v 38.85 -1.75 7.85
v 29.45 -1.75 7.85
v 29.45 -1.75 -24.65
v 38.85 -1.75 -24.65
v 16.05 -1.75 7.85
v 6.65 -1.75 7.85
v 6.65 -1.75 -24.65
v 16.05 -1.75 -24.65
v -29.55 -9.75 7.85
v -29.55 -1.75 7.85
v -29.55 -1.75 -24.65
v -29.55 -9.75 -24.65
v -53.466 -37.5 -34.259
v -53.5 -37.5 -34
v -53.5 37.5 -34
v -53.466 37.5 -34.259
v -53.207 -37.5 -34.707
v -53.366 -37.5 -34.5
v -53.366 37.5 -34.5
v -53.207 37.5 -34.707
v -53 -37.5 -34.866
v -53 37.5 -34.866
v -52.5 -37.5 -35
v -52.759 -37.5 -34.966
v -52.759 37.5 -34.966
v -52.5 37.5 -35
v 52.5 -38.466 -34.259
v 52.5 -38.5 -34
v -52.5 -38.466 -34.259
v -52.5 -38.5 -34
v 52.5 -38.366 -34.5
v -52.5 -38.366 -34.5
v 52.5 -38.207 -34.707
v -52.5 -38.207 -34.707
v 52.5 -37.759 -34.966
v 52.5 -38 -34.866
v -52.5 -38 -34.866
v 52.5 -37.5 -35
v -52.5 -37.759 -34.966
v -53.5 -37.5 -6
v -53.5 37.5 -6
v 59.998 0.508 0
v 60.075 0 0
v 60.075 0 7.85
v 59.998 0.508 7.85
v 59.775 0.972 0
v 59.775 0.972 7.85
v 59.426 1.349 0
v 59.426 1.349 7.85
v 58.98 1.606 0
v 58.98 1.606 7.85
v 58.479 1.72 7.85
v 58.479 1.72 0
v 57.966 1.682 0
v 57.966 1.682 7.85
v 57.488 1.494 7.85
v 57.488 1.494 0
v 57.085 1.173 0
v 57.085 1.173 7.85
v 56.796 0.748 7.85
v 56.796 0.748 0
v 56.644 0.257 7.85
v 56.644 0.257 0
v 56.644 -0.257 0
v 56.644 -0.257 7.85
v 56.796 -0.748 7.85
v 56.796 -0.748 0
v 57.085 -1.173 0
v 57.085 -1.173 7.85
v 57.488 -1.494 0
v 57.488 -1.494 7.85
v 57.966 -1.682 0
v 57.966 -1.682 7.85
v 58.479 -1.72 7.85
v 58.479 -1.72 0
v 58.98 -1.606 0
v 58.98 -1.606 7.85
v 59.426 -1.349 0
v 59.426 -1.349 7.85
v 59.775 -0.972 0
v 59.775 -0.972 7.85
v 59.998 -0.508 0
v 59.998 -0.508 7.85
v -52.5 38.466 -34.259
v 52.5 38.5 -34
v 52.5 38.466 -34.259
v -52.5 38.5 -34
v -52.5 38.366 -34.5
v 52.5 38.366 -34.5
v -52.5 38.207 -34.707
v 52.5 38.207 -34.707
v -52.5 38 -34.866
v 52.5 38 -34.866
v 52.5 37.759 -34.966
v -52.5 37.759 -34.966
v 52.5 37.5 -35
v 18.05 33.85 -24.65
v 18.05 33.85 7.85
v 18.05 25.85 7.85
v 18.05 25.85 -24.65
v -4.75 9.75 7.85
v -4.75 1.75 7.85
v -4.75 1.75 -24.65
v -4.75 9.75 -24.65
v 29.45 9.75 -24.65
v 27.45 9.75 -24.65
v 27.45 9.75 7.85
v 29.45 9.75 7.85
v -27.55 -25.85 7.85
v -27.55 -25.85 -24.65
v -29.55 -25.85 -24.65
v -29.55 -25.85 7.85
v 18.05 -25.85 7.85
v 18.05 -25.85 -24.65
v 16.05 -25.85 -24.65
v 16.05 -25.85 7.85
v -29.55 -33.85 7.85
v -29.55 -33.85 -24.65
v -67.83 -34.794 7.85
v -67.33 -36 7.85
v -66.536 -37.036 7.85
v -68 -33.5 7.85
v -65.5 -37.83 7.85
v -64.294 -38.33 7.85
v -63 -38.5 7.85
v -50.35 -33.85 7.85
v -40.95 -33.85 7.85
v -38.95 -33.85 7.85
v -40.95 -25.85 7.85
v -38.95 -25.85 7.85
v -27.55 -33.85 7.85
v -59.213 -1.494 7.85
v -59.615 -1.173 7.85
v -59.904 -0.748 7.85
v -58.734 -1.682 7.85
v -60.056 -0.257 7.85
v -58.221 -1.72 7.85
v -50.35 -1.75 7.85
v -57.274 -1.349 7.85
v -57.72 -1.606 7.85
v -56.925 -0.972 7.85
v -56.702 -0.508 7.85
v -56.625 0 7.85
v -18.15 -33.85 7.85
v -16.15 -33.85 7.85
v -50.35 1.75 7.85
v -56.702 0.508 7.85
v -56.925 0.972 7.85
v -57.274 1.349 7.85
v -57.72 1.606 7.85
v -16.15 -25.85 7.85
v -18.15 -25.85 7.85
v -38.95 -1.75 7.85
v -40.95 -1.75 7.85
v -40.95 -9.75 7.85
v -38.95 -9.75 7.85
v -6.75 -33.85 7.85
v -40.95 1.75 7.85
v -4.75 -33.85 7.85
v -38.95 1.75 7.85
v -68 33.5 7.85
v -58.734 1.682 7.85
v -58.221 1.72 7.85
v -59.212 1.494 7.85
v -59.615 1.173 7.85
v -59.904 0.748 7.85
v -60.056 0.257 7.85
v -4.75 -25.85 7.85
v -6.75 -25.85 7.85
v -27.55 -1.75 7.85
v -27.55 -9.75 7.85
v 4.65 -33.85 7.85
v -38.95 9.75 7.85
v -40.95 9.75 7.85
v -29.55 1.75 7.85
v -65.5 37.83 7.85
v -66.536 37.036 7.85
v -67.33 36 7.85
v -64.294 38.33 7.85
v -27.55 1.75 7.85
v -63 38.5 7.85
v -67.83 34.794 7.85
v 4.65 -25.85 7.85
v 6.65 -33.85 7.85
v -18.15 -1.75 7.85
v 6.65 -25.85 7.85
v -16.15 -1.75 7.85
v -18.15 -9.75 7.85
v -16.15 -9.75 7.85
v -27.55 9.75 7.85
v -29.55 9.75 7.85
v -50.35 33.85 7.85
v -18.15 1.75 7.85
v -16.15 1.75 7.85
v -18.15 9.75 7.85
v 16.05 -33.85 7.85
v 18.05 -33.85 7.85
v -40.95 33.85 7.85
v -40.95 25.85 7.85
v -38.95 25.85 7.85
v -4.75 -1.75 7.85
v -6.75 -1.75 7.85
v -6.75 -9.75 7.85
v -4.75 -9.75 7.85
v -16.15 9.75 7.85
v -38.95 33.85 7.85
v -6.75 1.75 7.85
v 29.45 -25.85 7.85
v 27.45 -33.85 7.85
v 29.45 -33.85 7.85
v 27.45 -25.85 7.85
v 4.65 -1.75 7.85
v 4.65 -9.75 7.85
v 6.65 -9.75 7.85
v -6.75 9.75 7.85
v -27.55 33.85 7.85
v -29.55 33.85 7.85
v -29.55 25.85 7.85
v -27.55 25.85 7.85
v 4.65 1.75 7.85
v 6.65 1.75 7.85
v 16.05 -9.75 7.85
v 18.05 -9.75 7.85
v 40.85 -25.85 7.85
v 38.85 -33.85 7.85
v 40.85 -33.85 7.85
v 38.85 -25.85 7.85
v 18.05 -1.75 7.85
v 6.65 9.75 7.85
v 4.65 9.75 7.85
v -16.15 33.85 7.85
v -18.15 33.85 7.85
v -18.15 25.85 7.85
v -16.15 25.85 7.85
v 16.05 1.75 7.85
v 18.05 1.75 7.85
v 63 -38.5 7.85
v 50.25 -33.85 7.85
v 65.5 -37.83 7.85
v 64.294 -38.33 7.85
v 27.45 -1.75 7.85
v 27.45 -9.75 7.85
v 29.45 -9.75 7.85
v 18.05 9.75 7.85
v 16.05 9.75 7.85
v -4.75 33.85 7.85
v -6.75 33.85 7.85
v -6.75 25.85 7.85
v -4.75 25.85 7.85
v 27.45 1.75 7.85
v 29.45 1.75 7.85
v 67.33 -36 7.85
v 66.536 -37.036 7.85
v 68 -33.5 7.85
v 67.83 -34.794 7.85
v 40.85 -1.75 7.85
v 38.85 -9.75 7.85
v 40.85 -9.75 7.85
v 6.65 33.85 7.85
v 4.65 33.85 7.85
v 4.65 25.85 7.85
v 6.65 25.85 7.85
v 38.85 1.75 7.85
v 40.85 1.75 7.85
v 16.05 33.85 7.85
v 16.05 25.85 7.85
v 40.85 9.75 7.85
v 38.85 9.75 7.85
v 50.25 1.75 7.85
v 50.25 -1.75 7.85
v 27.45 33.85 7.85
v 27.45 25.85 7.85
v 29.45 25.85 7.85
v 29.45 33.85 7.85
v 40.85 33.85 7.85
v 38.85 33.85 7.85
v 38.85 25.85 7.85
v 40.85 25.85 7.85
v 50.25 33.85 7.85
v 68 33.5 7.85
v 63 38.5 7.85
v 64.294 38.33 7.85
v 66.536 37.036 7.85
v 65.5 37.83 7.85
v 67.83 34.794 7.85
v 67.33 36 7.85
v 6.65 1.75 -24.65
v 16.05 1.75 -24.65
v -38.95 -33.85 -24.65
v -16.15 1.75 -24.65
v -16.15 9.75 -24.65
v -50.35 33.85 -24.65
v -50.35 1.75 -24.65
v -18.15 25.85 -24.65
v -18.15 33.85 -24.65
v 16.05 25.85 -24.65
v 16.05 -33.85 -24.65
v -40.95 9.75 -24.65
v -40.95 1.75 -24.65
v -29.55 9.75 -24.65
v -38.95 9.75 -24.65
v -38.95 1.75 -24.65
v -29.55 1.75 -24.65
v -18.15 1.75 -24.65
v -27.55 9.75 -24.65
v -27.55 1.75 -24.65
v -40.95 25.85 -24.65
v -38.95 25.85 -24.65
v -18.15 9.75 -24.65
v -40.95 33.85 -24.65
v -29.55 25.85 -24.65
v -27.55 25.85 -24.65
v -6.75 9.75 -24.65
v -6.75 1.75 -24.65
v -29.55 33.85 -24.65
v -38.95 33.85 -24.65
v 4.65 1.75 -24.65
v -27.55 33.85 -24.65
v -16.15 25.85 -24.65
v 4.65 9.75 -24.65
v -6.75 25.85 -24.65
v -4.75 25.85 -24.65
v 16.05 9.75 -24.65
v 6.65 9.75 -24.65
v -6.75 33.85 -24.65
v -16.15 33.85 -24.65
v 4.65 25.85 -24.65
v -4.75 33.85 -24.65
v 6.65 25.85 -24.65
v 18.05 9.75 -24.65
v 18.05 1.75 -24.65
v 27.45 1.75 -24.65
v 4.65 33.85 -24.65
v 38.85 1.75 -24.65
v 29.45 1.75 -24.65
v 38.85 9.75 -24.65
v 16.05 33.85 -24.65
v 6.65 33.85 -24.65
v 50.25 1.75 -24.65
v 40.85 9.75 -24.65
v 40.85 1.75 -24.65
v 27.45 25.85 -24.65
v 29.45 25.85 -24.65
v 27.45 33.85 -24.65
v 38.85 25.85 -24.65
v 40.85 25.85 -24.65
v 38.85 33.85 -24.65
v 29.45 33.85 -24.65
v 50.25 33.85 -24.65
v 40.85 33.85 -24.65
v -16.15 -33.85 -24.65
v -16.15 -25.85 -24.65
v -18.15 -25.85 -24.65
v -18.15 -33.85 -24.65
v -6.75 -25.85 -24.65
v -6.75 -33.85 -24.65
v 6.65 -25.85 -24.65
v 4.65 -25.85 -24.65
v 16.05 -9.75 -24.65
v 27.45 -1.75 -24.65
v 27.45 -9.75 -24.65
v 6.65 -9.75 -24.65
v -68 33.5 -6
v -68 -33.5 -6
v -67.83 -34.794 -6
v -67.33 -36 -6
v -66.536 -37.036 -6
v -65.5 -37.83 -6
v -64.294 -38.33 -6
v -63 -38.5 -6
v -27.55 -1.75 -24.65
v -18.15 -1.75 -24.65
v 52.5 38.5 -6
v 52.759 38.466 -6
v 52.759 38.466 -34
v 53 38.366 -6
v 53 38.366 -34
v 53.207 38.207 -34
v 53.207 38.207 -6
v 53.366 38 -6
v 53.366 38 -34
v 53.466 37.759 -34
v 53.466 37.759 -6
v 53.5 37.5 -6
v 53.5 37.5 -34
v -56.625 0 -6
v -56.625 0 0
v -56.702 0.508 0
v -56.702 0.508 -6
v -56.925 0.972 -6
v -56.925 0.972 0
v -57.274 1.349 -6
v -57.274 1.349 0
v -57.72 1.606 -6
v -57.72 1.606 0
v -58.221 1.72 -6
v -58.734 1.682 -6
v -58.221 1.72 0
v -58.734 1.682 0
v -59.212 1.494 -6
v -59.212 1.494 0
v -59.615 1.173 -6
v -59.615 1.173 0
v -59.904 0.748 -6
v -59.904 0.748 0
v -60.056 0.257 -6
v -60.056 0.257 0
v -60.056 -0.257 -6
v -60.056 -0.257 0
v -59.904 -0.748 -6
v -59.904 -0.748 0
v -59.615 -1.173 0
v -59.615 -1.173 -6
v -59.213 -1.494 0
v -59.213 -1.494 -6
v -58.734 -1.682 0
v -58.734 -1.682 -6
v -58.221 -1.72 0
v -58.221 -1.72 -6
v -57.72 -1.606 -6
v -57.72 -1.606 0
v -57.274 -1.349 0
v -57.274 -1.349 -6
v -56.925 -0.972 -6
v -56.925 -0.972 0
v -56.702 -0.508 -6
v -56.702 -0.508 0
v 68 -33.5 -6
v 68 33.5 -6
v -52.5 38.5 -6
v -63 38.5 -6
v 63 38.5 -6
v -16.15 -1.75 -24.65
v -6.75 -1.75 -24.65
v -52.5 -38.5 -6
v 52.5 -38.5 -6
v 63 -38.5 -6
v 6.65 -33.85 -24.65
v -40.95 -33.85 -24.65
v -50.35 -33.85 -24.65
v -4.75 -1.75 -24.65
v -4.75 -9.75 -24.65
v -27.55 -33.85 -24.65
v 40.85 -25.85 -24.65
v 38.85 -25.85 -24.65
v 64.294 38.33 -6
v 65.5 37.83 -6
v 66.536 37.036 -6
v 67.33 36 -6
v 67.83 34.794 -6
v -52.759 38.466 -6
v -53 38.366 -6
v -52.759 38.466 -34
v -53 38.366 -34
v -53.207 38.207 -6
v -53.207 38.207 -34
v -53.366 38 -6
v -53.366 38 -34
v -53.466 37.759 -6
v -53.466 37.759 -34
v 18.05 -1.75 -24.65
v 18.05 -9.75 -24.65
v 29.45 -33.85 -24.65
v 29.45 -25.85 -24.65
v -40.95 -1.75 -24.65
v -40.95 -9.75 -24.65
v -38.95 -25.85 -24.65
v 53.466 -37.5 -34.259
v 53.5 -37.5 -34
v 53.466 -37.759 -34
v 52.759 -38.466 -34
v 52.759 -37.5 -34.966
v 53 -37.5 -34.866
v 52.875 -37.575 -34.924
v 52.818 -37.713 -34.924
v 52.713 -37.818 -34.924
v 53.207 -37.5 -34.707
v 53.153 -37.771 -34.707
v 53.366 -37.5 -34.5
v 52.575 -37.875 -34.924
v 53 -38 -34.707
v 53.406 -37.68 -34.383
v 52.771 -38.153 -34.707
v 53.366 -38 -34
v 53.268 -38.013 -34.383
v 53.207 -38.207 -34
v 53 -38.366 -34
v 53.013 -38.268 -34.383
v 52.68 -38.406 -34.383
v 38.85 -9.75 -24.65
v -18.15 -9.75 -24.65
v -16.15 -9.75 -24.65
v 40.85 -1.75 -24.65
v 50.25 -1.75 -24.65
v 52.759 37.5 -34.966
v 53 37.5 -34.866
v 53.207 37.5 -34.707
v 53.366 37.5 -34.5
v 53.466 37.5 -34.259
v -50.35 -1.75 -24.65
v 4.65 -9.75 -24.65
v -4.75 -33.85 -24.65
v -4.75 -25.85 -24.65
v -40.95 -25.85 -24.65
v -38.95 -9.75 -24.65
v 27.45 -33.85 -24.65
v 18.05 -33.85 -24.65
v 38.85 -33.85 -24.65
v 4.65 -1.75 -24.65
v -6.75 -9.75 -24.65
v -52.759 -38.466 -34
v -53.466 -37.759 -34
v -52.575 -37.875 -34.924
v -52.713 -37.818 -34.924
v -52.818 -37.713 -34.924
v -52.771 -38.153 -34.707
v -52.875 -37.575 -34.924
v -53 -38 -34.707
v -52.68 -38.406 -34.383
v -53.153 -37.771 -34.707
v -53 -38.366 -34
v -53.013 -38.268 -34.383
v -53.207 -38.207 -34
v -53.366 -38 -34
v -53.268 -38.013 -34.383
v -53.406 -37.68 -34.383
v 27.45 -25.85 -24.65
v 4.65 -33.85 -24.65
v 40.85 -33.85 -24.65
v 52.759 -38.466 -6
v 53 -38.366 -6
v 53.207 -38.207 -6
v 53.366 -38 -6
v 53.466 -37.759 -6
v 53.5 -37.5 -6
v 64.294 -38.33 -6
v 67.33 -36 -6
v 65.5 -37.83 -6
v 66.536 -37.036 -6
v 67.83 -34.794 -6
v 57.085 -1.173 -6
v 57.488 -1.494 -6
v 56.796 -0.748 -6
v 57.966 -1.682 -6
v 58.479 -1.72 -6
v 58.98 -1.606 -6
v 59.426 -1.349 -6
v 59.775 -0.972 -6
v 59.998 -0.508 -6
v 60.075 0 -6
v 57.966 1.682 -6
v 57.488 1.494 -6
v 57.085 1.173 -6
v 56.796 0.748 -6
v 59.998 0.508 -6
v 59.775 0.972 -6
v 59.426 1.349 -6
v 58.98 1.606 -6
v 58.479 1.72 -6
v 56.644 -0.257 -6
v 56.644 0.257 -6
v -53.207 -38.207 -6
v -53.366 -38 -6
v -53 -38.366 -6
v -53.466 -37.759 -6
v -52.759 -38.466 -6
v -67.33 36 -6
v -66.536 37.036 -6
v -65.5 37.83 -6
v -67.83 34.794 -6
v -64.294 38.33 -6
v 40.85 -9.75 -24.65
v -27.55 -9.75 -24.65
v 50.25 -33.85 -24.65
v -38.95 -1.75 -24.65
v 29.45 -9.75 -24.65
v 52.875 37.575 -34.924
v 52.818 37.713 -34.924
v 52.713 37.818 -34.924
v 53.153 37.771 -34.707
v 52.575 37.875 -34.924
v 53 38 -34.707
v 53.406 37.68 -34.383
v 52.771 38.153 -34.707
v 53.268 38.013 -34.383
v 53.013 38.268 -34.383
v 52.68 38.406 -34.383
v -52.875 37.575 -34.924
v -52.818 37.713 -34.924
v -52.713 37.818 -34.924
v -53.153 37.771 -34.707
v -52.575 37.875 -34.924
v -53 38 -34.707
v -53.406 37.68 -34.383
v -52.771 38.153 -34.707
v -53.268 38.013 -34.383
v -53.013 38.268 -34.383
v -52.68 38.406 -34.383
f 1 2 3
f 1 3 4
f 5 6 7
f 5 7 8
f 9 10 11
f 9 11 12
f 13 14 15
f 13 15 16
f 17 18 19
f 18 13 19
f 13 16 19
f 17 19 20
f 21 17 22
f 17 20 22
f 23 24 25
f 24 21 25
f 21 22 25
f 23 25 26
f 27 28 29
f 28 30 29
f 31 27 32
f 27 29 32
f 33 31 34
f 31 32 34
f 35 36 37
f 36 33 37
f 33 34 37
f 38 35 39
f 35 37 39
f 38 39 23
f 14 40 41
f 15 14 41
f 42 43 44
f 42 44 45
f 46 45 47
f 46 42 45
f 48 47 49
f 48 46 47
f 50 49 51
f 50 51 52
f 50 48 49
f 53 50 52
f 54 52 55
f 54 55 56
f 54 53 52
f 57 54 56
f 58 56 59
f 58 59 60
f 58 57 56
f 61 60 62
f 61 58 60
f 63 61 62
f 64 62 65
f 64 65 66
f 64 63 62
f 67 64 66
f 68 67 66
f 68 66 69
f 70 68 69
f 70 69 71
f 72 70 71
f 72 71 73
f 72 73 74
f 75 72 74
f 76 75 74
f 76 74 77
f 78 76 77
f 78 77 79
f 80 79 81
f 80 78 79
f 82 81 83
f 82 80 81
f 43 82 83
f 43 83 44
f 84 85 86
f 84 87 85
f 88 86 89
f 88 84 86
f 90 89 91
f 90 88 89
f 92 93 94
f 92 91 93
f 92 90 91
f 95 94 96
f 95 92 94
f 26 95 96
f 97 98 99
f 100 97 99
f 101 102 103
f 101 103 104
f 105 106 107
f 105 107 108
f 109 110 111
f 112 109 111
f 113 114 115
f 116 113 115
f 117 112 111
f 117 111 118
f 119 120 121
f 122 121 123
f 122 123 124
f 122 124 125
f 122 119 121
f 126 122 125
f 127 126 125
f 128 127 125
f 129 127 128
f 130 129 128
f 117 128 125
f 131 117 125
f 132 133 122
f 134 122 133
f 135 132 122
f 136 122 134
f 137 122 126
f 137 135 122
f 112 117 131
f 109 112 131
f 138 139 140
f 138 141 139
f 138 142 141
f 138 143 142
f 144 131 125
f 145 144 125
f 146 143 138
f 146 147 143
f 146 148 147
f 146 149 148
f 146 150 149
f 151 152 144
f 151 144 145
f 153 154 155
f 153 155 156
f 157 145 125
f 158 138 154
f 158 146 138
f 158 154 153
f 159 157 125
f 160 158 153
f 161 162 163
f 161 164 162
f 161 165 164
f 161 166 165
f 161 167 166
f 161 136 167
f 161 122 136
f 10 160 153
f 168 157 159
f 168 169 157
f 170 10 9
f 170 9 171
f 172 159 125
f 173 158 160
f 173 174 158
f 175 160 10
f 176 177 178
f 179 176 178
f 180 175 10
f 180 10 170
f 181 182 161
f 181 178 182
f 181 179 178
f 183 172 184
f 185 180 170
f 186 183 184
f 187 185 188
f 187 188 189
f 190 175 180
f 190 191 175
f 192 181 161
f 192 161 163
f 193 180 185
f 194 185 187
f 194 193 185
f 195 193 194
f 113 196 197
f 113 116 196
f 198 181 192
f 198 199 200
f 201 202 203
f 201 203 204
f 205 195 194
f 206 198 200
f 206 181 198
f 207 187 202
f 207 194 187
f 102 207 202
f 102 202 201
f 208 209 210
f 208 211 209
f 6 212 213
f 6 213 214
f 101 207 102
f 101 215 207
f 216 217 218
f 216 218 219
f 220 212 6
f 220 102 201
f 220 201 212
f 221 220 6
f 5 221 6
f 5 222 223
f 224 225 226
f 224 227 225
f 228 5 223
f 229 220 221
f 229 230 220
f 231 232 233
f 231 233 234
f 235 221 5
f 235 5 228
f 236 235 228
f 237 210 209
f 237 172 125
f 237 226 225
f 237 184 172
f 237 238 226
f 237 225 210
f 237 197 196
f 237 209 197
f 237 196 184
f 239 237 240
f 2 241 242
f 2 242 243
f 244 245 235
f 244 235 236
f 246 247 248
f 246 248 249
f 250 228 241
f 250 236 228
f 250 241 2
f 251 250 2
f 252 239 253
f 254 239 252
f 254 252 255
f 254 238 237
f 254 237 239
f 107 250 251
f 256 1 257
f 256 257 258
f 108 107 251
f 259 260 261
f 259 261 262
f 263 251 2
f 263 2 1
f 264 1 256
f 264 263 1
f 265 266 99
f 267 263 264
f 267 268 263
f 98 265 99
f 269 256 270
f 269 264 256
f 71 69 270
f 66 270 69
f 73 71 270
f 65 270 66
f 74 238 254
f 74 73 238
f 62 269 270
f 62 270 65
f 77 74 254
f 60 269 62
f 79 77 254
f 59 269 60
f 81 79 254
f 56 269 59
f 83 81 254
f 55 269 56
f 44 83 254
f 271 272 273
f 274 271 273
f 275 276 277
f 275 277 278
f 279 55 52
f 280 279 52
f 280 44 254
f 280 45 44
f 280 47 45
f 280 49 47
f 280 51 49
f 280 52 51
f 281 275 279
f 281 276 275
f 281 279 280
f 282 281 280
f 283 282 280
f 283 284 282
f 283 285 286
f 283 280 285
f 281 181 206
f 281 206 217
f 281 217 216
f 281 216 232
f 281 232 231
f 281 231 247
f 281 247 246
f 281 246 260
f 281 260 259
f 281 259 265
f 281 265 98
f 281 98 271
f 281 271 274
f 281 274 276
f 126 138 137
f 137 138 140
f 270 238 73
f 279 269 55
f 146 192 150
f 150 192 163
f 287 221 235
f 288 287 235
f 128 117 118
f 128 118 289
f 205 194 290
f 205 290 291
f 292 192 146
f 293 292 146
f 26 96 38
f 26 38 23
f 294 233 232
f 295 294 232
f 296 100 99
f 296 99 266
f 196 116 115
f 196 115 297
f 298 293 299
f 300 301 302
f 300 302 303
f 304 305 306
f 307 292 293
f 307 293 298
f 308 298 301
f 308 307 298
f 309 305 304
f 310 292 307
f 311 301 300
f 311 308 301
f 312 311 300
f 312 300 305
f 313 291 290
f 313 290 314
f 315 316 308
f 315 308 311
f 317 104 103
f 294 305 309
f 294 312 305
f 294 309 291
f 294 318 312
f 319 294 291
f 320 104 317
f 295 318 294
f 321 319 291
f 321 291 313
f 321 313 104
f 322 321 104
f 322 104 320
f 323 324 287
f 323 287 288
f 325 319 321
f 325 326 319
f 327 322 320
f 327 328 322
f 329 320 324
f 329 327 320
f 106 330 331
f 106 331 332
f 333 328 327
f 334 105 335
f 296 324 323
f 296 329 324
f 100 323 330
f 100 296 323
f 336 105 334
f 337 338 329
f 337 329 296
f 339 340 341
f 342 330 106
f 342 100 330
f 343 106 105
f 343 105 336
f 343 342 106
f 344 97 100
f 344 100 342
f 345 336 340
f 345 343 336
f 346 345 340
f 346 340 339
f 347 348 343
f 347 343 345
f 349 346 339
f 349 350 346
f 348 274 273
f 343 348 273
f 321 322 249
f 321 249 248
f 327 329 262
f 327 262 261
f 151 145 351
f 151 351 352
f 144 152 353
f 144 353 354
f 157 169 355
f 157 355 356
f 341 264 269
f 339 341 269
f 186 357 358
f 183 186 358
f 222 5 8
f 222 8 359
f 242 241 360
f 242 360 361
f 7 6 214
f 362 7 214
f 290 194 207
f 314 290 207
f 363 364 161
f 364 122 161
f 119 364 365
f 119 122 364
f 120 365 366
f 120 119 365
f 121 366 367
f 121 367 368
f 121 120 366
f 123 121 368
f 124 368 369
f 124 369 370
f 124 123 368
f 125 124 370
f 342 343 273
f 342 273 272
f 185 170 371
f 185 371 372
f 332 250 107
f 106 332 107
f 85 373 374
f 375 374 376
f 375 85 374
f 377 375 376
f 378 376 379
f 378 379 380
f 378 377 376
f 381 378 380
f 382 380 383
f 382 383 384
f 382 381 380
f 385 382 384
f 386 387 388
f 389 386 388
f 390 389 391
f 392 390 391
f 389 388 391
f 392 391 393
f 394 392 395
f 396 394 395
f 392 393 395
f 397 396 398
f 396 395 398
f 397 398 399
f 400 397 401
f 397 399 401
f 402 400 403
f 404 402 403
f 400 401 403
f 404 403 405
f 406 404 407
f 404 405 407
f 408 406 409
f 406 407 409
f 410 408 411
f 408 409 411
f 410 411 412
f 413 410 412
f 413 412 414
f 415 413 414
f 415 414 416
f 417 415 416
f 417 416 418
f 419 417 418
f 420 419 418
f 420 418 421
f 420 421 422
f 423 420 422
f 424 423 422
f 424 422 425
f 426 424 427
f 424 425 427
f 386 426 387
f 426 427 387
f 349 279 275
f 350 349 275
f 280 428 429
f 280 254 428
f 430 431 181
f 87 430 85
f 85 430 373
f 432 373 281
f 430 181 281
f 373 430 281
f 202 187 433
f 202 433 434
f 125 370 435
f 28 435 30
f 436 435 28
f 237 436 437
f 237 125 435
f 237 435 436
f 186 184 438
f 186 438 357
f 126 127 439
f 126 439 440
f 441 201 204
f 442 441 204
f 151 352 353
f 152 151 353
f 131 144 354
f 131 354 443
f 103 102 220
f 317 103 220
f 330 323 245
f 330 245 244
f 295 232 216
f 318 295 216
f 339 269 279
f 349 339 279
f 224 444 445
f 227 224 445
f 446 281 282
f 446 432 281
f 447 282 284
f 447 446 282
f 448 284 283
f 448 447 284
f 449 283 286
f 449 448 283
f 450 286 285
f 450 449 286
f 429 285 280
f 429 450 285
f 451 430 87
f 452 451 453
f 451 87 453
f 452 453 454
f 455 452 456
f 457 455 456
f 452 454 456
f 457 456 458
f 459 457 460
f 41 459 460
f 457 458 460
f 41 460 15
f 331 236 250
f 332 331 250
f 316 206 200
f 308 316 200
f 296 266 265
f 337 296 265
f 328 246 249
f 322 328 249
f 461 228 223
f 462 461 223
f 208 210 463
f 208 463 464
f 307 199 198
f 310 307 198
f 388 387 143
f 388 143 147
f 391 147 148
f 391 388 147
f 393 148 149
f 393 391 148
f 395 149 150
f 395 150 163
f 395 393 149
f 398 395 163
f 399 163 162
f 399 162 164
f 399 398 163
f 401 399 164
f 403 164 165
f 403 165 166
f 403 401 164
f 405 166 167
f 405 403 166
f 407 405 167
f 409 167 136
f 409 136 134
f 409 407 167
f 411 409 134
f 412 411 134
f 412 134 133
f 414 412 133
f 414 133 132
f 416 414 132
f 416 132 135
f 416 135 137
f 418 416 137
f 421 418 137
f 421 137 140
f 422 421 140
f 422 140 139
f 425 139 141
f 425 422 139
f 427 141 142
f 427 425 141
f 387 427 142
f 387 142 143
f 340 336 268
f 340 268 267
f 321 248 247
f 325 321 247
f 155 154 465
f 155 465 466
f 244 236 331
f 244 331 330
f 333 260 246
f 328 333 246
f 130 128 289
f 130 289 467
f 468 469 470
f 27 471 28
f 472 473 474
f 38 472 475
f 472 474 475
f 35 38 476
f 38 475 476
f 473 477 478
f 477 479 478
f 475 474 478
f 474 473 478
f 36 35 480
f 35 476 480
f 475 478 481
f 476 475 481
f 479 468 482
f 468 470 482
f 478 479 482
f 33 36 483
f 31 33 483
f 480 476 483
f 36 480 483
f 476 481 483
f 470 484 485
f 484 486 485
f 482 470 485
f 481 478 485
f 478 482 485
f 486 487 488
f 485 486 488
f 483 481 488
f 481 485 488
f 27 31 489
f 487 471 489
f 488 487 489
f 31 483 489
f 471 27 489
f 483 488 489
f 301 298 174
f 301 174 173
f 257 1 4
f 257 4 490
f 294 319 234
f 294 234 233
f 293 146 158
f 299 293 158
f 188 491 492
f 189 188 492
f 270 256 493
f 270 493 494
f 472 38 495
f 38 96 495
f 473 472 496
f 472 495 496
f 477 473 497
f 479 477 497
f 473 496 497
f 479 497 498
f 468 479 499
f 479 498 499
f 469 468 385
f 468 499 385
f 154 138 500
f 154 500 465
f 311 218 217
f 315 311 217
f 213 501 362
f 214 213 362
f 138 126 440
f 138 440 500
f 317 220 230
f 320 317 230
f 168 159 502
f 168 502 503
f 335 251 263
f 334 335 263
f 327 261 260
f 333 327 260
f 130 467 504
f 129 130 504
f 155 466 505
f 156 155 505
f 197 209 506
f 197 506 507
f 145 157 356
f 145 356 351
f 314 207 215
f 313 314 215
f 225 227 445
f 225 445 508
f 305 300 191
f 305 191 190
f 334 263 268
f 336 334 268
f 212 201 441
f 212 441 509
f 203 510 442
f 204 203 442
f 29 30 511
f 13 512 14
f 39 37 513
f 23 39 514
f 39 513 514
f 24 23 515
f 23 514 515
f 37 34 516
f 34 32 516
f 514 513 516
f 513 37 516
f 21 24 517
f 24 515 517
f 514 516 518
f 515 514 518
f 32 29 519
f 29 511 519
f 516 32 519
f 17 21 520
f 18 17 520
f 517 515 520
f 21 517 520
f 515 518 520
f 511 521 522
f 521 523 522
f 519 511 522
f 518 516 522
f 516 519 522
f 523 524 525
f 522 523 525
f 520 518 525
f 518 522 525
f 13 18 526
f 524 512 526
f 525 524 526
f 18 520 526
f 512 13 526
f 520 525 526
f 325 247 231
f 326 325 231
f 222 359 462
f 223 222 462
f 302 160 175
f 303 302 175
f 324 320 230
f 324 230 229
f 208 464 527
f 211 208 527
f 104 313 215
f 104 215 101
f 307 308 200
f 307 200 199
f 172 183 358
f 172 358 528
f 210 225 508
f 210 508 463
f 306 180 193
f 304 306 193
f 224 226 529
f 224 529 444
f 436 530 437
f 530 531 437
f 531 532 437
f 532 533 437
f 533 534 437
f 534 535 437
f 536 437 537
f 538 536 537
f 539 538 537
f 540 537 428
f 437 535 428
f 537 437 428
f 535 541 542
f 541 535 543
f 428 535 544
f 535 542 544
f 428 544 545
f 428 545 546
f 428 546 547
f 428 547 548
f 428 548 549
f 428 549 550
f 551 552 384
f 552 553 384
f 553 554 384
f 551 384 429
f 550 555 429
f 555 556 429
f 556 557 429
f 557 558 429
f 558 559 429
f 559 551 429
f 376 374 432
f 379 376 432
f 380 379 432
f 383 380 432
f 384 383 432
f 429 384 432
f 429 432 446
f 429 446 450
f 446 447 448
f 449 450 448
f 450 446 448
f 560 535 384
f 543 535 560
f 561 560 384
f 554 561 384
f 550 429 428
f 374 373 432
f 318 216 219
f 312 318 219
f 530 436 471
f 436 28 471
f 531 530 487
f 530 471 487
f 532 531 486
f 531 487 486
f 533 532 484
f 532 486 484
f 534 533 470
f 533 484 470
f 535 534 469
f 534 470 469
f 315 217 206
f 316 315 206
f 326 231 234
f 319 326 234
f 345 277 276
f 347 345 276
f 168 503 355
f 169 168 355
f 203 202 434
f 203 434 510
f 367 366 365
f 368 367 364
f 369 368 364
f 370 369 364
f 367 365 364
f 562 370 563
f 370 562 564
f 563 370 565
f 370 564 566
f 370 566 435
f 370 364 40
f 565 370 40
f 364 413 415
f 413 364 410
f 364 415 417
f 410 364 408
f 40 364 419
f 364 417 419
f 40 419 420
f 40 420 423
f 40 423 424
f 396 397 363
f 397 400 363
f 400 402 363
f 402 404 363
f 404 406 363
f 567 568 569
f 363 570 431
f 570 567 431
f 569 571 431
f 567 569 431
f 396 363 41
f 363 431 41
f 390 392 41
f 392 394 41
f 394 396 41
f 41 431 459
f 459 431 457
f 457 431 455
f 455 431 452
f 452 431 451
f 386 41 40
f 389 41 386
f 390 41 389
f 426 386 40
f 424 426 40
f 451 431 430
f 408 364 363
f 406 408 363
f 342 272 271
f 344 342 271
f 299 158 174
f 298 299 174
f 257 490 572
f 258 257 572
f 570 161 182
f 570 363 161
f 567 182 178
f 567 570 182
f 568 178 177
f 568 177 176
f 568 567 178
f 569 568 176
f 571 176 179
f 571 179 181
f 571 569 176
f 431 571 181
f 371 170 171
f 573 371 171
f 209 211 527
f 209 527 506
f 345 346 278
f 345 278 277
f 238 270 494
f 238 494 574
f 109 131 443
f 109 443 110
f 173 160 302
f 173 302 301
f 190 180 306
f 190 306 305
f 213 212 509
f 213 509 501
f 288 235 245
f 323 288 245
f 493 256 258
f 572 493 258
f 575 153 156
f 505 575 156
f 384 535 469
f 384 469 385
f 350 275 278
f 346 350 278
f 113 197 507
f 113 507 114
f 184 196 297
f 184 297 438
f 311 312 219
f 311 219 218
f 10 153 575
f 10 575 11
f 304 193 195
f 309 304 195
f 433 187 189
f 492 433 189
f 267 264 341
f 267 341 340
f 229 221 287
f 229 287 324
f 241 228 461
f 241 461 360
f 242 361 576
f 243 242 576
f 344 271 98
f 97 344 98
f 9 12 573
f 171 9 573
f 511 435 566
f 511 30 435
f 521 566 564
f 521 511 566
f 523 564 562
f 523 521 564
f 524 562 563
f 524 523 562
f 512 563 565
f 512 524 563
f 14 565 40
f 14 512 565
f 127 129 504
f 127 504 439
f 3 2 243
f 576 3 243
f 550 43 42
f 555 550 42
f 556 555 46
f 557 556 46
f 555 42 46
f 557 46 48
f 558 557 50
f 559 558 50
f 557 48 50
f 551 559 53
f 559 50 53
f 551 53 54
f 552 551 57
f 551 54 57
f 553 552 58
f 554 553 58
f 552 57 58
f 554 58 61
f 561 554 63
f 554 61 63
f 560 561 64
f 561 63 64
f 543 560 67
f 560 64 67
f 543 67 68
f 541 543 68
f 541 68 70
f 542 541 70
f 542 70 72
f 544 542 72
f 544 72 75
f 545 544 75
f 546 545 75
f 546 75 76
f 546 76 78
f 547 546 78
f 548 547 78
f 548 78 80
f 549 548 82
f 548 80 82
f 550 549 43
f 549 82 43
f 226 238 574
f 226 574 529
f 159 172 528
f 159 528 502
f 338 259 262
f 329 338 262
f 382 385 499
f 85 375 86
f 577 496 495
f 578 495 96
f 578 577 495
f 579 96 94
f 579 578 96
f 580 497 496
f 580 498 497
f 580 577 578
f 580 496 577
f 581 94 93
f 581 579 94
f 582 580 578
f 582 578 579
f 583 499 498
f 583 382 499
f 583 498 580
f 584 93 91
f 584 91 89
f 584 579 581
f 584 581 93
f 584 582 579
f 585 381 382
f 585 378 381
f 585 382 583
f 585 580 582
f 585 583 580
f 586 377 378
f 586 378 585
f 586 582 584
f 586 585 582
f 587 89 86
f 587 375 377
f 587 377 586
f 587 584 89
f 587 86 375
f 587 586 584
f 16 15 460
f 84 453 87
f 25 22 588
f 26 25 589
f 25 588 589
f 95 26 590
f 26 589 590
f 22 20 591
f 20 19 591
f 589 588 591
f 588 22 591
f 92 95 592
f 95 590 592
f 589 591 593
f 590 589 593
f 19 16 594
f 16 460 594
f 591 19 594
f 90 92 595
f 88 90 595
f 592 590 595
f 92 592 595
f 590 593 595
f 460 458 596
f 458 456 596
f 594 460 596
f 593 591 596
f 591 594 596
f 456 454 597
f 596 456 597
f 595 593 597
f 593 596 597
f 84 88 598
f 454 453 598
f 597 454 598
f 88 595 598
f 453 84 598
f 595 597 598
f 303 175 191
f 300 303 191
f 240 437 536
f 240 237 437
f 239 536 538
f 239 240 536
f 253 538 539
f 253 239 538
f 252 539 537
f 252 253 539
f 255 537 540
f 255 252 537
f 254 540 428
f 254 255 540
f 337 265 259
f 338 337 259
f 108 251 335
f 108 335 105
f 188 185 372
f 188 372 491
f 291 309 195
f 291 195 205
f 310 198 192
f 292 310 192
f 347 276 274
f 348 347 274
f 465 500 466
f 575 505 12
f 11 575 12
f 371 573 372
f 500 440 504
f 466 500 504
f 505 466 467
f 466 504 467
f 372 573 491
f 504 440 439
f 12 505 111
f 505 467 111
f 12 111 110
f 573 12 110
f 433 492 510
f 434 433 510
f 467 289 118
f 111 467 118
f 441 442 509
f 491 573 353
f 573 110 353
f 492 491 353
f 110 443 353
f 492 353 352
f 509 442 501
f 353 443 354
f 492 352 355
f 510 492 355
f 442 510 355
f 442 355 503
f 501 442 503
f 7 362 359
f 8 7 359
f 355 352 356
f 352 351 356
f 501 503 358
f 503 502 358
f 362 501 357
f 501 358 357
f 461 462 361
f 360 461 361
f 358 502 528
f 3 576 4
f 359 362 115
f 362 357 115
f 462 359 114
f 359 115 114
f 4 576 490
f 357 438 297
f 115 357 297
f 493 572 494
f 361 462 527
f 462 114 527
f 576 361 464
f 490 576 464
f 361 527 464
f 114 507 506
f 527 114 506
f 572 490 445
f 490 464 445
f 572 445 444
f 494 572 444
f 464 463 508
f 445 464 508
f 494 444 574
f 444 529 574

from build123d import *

# Parameters (mm, degrees)
SKETCH1_W                = 136
SKETCH1_H                = 77
SKETCH1_R                = 1.725
BOSS_EXTRUDE1_DEPTH      = 7.85
BOSS_EXTRUDE1_DEPTH_BACK = 6
SKETCH2_W                = 107
SKETCH2_H                = 77
BOSS_EXTRUDE2_DEPTH      = 29
CUT_EXTRUDE1_DEPTH       = 32.5
SKETCH4_W                = 2
SKETCH4_H                = 8
BOSS_EXTRUDE3_DEPTH      = 32.5
FILLET1_R                = 5
FILLET4_R                = 1


with BuildPart() as part:
    # Sketch1 → Boss-Extrude1 (new body, two sides)
    with BuildSketch(Plane.XY) as boss_extrude1_sk:
        Rectangle(SKETCH1_W, SKETCH1_H)
        with Locations((-58.35, 0)):
            Circle(SKETCH1_R, mode=Mode.SUBTRACT)
        with Locations((58.35, 0)):
            Circle(SKETCH1_R, mode=Mode.SUBTRACT)
    extrude(amount=BOSS_EXTRUDE1_DEPTH)
    extrude(boss_extrude1_sk.sketch, amount=-BOSS_EXTRUDE1_DEPTH_BACK)

    # Sketch2 → Boss-Extrude2 (add)
    with BuildSketch(Plane(origin=(0, 0, -6), x_dir=(-1, 0, 0), z_dir=(0, 0, -1))):
        Rectangle(SKETCH2_W, SKETCH2_H)
    extrude(amount=BOSS_EXTRUDE2_DEPTH)

    # Sketch3 → Cut-Extrude1 (cut)
    with BuildSketch(Plane.XY.offset(7.85)):
        Polygon((-38.95, 33.85), (-38.95, 25.85), (-40.95, 25.85), (-40.95, 33.85), (-50.35, 33.85), (-50.35, 1.75), (50.25, 1.75), (50.25, 33.85), (40.85, 33.85), (40.85, 25.85), (38.85, 25.85), (38.85, 33.85), (29.45, 33.85), (29.45, 25.85), (27.45, 25.85), (27.45, 33.85), (18.05, 33.85), (18.05, 25.85), (16.05, 25.85), (16.05, 33.85), (6.65, 33.85), (6.65, 25.85), (4.65, 25.85), (4.65, 33.85), (-4.75, 33.85), (-4.75, 25.85), (-6.75, 25.85), (-6.75, 33.85), (-16.15, 33.85), (-16.15, 25.85), (-18.15, 25.85), (-18.15, 33.85), (-27.55, 33.85), (-27.55, 25.85), (-29.55, 25.85), (-29.55, 33.85), align=None)
    cut_extrude1 = extrude(amount=-CUT_EXTRUDE1_DEPTH, mode=Mode.SUBTRACT)

    # Mirror1: Cut-Extrude1 across plane
    add(cut_extrude1.mirror(Plane.ZX), mode=Mode.SUBTRACT)

    # Sketch4 → Boss-Extrude3 (add)
    with BuildSketch(Plane.XY.offset(7.85)):
        with Locations((-39.95, 5.75)):
            Rectangle(SKETCH4_W, SKETCH4_H)
        with Locations((-28.55, 5.75)):
            Rectangle(SKETCH4_W, SKETCH4_H)
        with Locations((-17.15, 5.75)):
            Rectangle(SKETCH4_W, SKETCH4_H)
        with Locations((-5.75, 5.75)):
            Rectangle(SKETCH4_W, SKETCH4_H)
        with Locations((5.65, 5.75)):
            Rectangle(SKETCH4_W, SKETCH4_H)
        with Locations((17.05, 5.75)):
            Rectangle(SKETCH4_W, SKETCH4_H)
        with Locations((28.45, 5.75)):
            Rectangle(SKETCH4_W, SKETCH4_H)
        with Locations((39.85, 5.75)):
            Rectangle(SKETCH4_W, SKETCH4_H)
    boss_extrude3 = extrude(amount=-BOSS_EXTRUDE3_DEPTH)

    # Mirror2: Boss-Extrude3 across plane
    add(boss_extrude3.mirror(Plane.ZX))

    # Fillet1
    fillet1_edges = [part.edges().sort_by_distance(p)[0] for p in [
        (-68, 38.5, 0.925),
        (68, 38.5, 0.925),
        (68, -38.5, 0.925),
        (-68, -38.5, 0.925),
    ]]
    fillet(fillet1_edges, radius=FILLET1_R)

    # Fillet4
    fillet4_edges = [part.edges().sort_by_distance(p)[0] for p in [
        (53.5, 38.5, -20.5),
        (53.5, -38.5, -20.5),
        (-53.5, -38.5, -20.5),
        (-53.5, 38.5, -20.5),
        (53.5, 0, -35),
        (0, -38.5, -35),
        (-53.5, 0, -35),
        (0, 38.5, -35),
    ]]
    fillet(fillet4_edges, radius=FILLET4_R)


solid = part.part
